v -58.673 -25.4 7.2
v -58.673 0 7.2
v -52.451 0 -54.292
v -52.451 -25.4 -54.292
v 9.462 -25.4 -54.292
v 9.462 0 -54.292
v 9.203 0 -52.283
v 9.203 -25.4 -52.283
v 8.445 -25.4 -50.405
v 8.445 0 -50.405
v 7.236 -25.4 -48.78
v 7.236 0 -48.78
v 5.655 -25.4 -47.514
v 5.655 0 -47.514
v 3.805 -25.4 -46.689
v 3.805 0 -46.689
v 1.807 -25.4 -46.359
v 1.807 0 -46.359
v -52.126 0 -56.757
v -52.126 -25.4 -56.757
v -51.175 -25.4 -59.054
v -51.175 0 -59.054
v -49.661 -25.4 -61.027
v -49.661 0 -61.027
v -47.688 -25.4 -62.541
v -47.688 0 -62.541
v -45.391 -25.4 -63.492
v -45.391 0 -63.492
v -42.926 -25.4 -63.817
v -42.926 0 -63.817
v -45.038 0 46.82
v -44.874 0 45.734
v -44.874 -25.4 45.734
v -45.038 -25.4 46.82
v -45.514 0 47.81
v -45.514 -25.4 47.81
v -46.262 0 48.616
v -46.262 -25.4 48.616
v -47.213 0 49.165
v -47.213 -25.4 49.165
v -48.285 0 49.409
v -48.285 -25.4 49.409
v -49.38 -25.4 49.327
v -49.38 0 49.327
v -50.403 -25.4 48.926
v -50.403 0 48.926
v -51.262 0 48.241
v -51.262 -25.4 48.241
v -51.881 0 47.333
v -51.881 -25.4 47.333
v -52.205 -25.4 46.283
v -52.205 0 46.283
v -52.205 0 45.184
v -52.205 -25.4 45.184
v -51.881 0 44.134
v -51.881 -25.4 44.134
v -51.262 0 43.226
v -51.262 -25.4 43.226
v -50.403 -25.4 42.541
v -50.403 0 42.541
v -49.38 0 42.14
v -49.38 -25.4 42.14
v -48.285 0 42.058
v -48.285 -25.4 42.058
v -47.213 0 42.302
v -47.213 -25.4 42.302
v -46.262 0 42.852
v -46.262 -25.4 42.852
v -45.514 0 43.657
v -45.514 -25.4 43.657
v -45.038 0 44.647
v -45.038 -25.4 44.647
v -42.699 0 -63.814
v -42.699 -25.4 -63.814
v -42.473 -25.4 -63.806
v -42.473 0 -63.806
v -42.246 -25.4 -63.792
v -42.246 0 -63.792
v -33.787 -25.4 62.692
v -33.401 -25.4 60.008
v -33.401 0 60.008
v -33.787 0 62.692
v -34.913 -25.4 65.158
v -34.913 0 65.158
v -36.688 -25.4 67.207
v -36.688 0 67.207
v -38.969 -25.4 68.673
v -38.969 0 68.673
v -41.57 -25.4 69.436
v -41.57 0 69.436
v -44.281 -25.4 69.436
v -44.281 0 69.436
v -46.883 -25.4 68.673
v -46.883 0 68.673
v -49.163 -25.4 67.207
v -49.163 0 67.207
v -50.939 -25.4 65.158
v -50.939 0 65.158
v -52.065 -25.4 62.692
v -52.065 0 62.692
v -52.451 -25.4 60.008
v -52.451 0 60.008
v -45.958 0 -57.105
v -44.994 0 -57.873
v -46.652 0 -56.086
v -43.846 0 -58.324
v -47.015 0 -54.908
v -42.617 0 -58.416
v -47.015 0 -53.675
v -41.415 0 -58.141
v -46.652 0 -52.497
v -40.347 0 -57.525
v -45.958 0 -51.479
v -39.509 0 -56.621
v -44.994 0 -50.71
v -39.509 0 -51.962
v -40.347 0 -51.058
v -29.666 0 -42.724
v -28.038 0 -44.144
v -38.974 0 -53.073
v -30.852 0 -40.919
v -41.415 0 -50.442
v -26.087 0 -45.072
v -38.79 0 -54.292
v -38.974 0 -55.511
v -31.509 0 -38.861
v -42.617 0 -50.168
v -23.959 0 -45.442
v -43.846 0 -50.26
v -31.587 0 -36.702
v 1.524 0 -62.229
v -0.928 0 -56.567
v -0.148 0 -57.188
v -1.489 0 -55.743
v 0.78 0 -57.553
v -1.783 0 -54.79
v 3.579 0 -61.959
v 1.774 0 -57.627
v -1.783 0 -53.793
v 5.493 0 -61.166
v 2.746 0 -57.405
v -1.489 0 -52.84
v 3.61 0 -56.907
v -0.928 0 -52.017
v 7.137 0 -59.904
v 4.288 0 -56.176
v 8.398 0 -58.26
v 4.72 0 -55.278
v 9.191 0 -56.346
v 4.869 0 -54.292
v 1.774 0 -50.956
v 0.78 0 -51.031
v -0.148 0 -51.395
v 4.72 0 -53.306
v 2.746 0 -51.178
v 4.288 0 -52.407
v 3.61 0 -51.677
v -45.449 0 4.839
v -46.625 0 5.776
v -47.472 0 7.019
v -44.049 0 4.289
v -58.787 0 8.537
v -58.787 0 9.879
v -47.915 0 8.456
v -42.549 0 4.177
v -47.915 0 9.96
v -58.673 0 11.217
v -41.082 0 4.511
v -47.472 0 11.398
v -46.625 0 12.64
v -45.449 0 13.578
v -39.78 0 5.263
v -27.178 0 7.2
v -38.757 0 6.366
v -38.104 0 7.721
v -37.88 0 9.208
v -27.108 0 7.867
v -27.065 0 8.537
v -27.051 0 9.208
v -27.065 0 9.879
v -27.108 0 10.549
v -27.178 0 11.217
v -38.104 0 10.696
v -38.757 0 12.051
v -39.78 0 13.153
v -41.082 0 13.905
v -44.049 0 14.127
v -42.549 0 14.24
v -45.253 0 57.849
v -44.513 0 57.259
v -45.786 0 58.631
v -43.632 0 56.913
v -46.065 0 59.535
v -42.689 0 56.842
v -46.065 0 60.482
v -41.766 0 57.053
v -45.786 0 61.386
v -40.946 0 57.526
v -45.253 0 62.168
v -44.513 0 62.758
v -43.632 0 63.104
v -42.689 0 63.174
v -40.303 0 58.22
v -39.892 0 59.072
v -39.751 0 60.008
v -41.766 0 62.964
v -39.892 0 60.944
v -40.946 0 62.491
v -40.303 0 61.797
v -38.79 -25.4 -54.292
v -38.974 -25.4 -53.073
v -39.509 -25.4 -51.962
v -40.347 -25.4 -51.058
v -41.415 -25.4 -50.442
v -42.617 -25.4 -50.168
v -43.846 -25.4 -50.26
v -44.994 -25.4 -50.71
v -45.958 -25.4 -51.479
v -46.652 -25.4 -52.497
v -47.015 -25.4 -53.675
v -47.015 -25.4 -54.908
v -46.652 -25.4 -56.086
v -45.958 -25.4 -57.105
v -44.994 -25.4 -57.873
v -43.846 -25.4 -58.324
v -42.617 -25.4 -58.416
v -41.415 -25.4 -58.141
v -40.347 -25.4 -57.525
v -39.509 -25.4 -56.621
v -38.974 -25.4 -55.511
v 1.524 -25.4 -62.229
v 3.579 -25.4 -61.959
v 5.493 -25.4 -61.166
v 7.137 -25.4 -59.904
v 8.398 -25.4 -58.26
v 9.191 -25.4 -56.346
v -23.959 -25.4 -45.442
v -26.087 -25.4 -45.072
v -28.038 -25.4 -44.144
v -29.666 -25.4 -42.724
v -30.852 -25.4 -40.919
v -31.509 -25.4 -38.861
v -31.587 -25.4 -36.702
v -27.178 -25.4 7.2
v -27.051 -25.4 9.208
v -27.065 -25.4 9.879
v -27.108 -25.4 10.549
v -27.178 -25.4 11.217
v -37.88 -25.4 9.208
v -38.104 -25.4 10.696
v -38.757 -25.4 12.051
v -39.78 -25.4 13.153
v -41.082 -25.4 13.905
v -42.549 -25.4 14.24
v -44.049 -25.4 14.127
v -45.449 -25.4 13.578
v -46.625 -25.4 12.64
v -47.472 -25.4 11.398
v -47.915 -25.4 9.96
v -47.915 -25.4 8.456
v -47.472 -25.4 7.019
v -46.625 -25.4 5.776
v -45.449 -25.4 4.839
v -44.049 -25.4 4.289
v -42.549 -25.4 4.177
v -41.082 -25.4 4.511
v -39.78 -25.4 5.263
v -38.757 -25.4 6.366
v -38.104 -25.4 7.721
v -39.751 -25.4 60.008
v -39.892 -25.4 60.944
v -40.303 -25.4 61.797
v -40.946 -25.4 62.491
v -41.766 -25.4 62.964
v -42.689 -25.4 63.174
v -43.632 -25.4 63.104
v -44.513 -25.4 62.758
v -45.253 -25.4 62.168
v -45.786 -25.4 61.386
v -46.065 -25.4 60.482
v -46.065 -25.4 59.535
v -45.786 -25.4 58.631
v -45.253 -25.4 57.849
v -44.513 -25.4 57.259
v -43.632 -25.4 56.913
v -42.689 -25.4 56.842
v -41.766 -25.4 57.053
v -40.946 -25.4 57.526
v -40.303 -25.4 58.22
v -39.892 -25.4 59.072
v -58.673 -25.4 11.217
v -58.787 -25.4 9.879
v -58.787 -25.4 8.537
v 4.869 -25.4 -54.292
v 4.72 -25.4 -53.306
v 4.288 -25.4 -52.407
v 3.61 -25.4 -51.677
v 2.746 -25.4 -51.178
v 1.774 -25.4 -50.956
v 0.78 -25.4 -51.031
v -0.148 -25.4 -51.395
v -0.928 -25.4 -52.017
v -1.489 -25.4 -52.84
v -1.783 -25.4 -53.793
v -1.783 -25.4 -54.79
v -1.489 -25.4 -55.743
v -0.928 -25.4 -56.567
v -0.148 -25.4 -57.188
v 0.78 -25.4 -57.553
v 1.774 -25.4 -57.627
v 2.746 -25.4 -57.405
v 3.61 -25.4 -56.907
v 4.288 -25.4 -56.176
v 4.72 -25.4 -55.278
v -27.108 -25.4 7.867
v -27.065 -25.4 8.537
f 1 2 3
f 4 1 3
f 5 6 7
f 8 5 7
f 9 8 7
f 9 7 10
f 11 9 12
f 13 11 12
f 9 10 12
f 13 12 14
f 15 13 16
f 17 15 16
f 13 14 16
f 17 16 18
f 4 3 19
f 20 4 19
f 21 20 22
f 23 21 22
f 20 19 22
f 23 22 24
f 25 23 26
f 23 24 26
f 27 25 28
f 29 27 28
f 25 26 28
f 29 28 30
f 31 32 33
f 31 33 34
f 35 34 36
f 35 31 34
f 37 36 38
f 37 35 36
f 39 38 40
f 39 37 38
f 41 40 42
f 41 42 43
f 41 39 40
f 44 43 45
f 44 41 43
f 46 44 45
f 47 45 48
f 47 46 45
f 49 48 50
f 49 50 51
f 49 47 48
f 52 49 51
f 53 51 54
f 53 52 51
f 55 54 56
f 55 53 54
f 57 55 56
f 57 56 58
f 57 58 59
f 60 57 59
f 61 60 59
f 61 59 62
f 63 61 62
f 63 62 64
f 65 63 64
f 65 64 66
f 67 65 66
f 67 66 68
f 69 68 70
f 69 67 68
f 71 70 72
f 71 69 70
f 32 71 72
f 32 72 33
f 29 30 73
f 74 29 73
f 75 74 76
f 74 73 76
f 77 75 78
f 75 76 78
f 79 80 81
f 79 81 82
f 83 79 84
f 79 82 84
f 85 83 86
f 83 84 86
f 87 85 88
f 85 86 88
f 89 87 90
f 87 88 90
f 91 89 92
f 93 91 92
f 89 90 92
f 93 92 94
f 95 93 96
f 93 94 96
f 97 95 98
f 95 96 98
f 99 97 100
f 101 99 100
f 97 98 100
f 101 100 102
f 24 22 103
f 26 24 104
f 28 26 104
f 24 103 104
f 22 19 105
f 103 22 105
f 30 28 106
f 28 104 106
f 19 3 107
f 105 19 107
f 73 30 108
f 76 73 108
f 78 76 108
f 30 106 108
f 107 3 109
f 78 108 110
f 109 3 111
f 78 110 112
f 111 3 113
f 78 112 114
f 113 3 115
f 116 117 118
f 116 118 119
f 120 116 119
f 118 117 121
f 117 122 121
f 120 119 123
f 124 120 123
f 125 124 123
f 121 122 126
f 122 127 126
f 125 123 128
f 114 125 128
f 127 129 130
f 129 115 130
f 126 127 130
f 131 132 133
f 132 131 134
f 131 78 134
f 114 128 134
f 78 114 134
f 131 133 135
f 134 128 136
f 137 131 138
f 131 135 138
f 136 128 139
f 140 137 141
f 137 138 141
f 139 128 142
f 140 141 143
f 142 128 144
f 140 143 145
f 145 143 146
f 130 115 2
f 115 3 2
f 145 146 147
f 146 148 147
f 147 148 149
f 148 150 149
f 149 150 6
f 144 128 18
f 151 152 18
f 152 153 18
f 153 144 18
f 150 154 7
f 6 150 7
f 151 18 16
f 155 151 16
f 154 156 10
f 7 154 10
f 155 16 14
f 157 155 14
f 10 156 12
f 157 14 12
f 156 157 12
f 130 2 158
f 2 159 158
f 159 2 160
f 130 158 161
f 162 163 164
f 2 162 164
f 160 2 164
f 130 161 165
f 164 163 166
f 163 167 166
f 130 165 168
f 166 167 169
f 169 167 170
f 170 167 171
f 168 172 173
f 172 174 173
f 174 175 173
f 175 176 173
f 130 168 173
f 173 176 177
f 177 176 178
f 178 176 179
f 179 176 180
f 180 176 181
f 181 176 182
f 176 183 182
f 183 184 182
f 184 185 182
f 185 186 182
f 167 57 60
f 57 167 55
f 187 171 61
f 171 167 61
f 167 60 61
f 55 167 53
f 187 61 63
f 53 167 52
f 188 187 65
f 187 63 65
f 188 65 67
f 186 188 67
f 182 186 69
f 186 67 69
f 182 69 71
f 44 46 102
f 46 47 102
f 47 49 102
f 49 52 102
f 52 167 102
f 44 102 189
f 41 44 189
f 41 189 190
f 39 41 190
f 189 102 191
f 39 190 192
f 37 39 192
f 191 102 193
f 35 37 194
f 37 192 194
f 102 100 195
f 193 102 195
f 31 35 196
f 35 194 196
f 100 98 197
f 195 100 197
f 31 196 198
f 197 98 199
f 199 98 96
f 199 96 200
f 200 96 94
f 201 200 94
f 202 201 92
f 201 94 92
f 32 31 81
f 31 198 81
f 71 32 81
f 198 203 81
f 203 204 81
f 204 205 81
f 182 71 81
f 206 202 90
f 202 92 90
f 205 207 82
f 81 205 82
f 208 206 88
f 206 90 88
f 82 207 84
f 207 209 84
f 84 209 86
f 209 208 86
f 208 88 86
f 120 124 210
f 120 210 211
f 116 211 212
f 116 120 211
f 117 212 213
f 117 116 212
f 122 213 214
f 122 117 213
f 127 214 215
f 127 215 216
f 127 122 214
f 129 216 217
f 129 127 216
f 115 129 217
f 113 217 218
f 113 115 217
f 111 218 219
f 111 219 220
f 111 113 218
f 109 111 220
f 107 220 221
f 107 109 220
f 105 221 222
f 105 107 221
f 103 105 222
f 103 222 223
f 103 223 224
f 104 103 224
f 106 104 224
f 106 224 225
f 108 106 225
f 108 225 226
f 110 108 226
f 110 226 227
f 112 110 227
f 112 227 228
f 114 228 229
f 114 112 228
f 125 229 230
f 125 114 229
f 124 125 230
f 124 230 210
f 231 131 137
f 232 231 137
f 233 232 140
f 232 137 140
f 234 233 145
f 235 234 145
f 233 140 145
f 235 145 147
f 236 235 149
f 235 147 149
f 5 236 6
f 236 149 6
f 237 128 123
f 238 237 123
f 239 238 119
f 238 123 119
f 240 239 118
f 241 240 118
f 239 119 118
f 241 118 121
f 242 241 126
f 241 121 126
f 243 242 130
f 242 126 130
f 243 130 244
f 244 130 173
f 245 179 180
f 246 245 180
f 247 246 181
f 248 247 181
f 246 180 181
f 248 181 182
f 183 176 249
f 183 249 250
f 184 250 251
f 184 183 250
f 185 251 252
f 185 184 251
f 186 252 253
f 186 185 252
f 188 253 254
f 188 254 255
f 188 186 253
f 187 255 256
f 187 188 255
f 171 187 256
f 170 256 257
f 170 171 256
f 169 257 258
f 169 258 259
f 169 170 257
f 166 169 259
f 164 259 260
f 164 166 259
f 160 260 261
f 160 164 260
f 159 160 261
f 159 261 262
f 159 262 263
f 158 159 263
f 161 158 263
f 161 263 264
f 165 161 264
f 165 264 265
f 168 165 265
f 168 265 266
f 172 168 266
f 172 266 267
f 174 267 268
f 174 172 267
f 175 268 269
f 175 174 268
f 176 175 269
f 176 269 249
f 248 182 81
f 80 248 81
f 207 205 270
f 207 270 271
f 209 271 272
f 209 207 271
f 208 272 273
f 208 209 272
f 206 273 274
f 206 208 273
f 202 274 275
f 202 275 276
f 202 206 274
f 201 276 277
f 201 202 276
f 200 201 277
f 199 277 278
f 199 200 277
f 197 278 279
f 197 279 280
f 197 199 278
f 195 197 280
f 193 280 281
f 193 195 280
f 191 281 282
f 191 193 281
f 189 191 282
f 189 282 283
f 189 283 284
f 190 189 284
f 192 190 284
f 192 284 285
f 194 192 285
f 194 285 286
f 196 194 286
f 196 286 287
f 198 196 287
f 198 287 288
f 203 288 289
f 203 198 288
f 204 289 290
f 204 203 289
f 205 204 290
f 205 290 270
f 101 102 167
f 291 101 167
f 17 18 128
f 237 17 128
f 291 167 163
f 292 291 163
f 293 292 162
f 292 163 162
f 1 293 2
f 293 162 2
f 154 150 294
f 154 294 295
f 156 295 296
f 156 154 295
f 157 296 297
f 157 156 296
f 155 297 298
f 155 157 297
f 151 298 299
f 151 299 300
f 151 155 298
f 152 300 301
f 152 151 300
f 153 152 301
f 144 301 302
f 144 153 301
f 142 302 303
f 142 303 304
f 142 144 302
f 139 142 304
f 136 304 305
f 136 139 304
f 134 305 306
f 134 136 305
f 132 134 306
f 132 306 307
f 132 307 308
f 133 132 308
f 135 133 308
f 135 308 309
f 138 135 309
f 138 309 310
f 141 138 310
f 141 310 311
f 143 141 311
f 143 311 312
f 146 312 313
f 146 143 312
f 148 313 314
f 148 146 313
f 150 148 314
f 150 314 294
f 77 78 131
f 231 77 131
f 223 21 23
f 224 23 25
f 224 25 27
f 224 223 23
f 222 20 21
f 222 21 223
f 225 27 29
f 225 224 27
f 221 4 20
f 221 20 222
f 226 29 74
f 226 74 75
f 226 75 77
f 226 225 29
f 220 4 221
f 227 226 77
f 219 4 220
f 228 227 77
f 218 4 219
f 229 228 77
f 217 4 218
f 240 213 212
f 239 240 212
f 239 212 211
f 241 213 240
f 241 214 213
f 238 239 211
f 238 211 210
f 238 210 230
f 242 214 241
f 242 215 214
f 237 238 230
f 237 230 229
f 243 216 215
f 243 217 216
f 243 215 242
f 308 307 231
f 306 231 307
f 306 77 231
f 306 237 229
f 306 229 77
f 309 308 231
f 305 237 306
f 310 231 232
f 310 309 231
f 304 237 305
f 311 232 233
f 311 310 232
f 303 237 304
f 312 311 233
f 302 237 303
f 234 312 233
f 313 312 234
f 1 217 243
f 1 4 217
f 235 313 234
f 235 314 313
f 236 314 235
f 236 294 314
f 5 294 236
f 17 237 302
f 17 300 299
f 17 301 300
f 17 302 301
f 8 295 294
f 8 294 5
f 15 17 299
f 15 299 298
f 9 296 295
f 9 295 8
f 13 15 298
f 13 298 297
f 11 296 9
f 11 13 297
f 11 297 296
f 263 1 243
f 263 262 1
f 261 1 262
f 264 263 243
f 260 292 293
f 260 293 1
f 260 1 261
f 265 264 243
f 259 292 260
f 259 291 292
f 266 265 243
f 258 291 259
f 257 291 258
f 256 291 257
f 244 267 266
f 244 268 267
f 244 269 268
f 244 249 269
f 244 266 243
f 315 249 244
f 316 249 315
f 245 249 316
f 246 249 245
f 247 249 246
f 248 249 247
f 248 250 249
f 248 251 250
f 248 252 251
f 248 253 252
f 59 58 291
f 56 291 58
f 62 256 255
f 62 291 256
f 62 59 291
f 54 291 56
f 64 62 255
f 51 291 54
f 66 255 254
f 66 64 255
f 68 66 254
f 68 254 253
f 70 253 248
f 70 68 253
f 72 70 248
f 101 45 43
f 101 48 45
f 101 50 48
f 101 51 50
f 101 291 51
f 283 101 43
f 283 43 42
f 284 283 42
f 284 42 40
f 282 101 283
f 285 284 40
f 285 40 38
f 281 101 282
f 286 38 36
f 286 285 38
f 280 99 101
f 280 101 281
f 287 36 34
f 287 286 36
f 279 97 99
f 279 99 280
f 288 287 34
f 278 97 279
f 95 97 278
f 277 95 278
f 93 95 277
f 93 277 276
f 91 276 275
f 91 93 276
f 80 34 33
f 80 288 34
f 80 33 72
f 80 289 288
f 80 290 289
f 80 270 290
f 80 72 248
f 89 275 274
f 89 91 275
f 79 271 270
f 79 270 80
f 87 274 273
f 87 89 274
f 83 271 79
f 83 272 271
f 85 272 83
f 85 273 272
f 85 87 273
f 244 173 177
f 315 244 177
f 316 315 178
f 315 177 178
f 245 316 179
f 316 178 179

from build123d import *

# Parameters (mm, degrees)
F0_R     = 3.175
F0_R_2   = 3.686252
F0_R_3   = 5.045636
F0_R_4   = 4.135696
F0_R_5   = 3.3448
F1_DEPTH = 25.4


with BuildPart() as f1:
    # F0 (on Front) → F1 (new body)
    with BuildSketch(Plane.XZ):
        with BuildLine():
            ThreePointArc((-52.450832, 60.008334), (-42.925832, 50.483334), (-33.400832, 60.008334))
            ThreePointArc((-33.400832, 60.008334), (-42.925832, 69.533334), (-52.450832, 60.008334))
        make_face()
        with Locations((-42.925832, 60.008334)):
            Circle(F0_R, mode=Mode.SUBTRACT)
        with BuildLine():
            Line((-27.178375, 11.216623), (-33.400832, 60.008334))
            ThreePointArc((-33.400832, 60.008334), (-42.925832, 50.483334), (-52.450832, 60.008334))
            Line((-52.450832, 60.008334), (-58.673289, 11.216623))
            ThreePointArc((-58.673289, 11.216623), (-42.925832, 25.083334), (-27.178375, 11.216623))
        make_face()
        with Locations((-48.560176, 45.733534)):
            Circle(F0_R_2, mode=Mode.SUBTRACT)
        with BuildLine():
            ThreePointArc((-27.050832, 9.208334), (-27.08275, 10.214501), (-27.178375, 11.216623))
            ThreePointArc((-27.178375, 11.216623), (-42.925832, 25.083334), (-58.673289, 11.216623))
            ThreePointArc((-58.673289, 11.216623), (-58.800832, 9.208334), (-58.673289, 7.200044))
            ThreePointArc((-58.673289, 7.200044), (-42.925832, -6.666666), (-27.178375, 7.200044))
            ThreePointArc((-27.178375, 7.200044), (-27.08275, 8.202166), (-27.050832, 9.208334))
        make_face()
        with Locations((-42.925832, 9.208334)):
            Circle(F0_R_3, mode=Mode.SUBTRACT)
        with BuildLine():
            ThreePointArc((-27.178375, 7.200044), (-42.925832, -6.666666), (-58.673289, 7.200044))
            Line((-58.673289, 7.200044), (-52.450832, -54.291666))
            ThreePointArc((-52.450832, -54.291666), (-42.925832, -44.766666), (-33.400832, -54.291666))
            ThreePointArc((-33.400832, -54.291666), (-35.954542, -60.782178), (-42.246341, -63.792399))
            Line((-42.246341, -63.792399), (1.524168, -62.229166))
            ThreePointArc((1.524168, -62.229166), (-6.412075, -54.150441), (1.806574, -46.359192))
            Line((1.806574, -46.359192), (-23.959184, -45.441901))
            ThreePointArc((-23.959184, -45.441901), (-29.666072, -42.724413), (-31.586747, -36.702426))
            Line((-31.586747, -36.702426), (-27.178375, 7.200044))
        make_face()
        with BuildLine():
            ThreePointArc((-33.400832, -54.291666), (-42.925832, -44.766666), (-52.450832, -54.291666))
            ThreePointArc((-52.450832, -54.291666), (-49.661024, -61.026858), (-42.925832, -63.816666))
            Line((-42.925832, -63.816666), (-42.246341, -63.792399))
            ThreePointArc((-42.246341, -63.792399), (-35.954542, -60.782178), (-33.400832, -54.291666))
        make_face()
        with Locations((-42.925832, -54.291666)):
            Circle(F0_R_4, mode=Mode.SUBTRACT)
        with BuildLine():
            Line((-42.246341, -63.792399), (-42.925832, -63.816666))
            ThreePointArc((-42.925832, -63.816666), (-42.58587, -63.810597), (-42.246341, -63.792399))
        make_face()
        with BuildLine():
            ThreePointArc((9.461668, -54.291666), (7.235801, -48.779756), (1.806574, -46.359192))
            ThreePointArc((1.806574, -46.359192), (-6.412075, -54.150441), (1.524168, -62.229166))
            ThreePointArc((1.524168, -62.229166), (7.136828, -59.904326), (9.461668, -54.291666))
        make_face()
        with Locations((1.524168, -54.291666)):
            Circle(F0_R_5, mode=Mode.SUBTRACT)
    extrude(amount=F1_DEPTH)


solid = f1.part
